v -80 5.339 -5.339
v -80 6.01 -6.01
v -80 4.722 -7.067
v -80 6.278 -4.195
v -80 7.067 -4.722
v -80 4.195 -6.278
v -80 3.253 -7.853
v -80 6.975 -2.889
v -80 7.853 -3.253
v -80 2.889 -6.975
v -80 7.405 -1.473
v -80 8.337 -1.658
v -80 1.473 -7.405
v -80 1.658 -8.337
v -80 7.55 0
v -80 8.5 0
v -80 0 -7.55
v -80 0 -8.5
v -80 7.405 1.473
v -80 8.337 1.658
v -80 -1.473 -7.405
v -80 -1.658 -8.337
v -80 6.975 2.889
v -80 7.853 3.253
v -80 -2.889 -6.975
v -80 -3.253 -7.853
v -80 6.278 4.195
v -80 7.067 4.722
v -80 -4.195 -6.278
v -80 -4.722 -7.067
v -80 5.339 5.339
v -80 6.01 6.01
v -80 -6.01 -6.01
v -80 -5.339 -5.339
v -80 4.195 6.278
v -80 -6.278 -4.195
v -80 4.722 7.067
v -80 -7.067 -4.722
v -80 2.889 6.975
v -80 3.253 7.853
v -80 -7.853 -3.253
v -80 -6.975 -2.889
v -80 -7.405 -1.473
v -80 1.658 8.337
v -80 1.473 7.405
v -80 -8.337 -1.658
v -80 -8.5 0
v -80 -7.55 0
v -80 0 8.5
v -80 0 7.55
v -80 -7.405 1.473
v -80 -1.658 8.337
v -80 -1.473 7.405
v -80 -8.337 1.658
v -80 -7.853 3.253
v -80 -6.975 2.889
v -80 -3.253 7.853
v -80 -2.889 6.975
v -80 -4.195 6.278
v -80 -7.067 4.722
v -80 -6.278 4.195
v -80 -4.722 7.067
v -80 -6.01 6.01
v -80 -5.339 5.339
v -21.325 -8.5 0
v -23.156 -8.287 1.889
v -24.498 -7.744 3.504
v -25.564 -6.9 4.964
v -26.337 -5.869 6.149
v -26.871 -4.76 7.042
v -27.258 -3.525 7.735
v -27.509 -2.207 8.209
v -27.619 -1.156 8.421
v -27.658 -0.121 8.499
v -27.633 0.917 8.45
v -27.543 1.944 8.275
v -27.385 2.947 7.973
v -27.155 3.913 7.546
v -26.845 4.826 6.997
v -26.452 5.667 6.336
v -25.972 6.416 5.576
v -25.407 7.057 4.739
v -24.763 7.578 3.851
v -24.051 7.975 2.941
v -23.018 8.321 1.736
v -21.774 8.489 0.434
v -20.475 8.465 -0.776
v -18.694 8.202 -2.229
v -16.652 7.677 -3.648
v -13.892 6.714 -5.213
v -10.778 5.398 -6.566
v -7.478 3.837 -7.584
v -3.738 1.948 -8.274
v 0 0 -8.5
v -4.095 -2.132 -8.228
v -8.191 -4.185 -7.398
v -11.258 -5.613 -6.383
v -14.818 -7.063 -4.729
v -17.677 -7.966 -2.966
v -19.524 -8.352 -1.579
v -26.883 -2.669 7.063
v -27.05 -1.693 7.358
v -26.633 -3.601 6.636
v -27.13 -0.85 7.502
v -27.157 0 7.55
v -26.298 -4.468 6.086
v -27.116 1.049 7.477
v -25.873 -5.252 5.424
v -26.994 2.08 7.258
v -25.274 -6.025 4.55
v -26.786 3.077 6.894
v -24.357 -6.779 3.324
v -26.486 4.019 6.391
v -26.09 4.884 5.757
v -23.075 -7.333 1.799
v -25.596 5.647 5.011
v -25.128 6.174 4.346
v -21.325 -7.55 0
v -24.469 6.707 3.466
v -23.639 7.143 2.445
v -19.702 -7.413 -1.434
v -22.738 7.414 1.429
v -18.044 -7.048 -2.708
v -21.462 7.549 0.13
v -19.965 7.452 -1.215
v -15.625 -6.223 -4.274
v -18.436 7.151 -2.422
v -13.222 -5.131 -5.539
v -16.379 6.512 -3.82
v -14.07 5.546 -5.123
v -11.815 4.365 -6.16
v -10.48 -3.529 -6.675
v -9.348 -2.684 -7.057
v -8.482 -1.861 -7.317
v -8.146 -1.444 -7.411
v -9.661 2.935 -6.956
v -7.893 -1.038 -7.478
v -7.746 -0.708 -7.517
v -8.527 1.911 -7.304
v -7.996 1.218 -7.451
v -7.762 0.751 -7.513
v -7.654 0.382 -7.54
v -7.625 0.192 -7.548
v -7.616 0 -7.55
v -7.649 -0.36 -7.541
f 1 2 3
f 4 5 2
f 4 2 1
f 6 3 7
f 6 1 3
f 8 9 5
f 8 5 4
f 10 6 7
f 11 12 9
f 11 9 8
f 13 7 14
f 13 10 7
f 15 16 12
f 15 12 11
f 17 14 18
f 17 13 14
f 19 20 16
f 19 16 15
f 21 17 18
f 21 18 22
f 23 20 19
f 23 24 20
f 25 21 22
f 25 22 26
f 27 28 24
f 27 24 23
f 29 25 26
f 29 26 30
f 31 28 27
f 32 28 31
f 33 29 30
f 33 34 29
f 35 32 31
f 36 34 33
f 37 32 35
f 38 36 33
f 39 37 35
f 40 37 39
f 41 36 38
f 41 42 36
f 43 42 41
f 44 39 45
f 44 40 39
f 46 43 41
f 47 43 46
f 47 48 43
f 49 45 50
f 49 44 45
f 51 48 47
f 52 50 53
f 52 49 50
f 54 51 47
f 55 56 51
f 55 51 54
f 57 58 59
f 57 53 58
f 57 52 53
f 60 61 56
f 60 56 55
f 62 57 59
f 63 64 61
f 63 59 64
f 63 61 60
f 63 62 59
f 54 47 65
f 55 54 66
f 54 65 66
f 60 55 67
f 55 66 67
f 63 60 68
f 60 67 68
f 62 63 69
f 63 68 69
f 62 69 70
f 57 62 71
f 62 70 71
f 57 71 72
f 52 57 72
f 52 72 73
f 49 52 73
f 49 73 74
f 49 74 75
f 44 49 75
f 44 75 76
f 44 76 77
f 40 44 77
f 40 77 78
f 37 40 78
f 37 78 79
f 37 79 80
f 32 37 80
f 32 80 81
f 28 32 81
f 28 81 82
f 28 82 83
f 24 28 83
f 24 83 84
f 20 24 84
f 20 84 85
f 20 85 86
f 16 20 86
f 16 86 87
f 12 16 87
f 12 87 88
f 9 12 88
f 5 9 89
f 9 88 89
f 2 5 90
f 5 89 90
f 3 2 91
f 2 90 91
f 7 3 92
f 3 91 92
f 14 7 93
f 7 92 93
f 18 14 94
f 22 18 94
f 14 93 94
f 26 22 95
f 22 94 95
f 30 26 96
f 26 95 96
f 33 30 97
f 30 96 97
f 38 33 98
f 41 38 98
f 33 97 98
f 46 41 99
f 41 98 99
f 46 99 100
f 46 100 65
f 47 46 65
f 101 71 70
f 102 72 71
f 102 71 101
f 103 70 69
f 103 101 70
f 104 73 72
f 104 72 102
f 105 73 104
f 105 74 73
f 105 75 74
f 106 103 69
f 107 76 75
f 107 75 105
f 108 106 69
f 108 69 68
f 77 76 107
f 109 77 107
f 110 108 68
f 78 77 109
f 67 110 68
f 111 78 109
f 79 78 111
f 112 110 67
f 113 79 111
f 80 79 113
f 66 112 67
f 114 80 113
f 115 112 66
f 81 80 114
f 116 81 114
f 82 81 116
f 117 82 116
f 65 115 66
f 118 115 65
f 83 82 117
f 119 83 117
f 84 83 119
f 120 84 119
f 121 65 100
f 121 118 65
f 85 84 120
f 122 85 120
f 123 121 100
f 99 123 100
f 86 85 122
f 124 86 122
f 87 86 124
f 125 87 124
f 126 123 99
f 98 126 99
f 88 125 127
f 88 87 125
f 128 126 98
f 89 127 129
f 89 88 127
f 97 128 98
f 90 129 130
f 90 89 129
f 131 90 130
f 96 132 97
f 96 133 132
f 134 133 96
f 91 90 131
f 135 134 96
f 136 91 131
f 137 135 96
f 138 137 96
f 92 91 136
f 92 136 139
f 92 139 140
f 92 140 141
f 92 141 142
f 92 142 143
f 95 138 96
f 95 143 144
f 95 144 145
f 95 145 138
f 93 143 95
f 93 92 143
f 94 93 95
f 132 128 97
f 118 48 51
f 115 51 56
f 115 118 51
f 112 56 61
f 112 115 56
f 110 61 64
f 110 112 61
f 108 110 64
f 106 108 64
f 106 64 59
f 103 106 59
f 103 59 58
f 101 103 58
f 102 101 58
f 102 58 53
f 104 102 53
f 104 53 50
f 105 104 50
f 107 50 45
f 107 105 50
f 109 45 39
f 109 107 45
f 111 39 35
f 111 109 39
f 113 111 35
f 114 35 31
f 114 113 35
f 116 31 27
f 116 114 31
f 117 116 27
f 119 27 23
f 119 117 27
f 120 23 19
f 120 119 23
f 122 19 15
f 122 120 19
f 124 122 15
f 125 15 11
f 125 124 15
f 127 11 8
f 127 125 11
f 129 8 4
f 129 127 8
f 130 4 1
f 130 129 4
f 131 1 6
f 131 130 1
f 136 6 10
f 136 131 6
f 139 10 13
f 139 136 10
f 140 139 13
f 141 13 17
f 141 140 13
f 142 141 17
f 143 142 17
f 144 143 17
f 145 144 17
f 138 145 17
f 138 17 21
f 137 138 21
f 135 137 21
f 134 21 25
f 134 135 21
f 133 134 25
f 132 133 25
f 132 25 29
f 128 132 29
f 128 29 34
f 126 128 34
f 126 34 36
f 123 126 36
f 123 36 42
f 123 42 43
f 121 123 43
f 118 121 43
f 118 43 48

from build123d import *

# Parameters (mm, degrees)
F0_R     = 8.5
F0_R_2   = 7.55
F1_DEPTH = 80
F2_R     = 31
F3_DEPTH = 25.4
F4_DEPTH = 25.4
F6_ANGLE = -90
F8_ANGLE = -90


with BuildPart() as f1:
    # F0 (on Top) → F1 (new body)
    with BuildSketch(Plane.XY):
        Circle(F0_R)
        Circle(F0_R_2, mode=Mode.SUBTRACT)
    extrude(amount=F1_DEPTH)

    # F2 (on Right) → F3 (cut)
    with BuildSketch(Plane.YZ):
        with Locations((22.5, 0)):
            Circle(F2_R)
    extrude(amount=-F3_DEPTH, mode=Mode.SUBTRACT)

    # F2 (on Right) → F4 (cut)
    with BuildSketch(Plane.YZ):
        with Locations((22.5, 0)):
            Circle(F2_R)
    extrude(amount=F4_DEPTH, mode=Mode.SUBTRACT)


with BuildPart() as f1_1:
    # F6: moved
    add(f1.part.rotate(Axis((14.042603, 0, 0), (-1, 0, 0)), F6_ANGLE))


with BuildPart() as f1_2:
    # F8: moved
    add(f1_1.part.rotate(Axis((0, 0, 13.531513), (0, 0, 1)), F8_ANGLE))


solid = f1_2.part
